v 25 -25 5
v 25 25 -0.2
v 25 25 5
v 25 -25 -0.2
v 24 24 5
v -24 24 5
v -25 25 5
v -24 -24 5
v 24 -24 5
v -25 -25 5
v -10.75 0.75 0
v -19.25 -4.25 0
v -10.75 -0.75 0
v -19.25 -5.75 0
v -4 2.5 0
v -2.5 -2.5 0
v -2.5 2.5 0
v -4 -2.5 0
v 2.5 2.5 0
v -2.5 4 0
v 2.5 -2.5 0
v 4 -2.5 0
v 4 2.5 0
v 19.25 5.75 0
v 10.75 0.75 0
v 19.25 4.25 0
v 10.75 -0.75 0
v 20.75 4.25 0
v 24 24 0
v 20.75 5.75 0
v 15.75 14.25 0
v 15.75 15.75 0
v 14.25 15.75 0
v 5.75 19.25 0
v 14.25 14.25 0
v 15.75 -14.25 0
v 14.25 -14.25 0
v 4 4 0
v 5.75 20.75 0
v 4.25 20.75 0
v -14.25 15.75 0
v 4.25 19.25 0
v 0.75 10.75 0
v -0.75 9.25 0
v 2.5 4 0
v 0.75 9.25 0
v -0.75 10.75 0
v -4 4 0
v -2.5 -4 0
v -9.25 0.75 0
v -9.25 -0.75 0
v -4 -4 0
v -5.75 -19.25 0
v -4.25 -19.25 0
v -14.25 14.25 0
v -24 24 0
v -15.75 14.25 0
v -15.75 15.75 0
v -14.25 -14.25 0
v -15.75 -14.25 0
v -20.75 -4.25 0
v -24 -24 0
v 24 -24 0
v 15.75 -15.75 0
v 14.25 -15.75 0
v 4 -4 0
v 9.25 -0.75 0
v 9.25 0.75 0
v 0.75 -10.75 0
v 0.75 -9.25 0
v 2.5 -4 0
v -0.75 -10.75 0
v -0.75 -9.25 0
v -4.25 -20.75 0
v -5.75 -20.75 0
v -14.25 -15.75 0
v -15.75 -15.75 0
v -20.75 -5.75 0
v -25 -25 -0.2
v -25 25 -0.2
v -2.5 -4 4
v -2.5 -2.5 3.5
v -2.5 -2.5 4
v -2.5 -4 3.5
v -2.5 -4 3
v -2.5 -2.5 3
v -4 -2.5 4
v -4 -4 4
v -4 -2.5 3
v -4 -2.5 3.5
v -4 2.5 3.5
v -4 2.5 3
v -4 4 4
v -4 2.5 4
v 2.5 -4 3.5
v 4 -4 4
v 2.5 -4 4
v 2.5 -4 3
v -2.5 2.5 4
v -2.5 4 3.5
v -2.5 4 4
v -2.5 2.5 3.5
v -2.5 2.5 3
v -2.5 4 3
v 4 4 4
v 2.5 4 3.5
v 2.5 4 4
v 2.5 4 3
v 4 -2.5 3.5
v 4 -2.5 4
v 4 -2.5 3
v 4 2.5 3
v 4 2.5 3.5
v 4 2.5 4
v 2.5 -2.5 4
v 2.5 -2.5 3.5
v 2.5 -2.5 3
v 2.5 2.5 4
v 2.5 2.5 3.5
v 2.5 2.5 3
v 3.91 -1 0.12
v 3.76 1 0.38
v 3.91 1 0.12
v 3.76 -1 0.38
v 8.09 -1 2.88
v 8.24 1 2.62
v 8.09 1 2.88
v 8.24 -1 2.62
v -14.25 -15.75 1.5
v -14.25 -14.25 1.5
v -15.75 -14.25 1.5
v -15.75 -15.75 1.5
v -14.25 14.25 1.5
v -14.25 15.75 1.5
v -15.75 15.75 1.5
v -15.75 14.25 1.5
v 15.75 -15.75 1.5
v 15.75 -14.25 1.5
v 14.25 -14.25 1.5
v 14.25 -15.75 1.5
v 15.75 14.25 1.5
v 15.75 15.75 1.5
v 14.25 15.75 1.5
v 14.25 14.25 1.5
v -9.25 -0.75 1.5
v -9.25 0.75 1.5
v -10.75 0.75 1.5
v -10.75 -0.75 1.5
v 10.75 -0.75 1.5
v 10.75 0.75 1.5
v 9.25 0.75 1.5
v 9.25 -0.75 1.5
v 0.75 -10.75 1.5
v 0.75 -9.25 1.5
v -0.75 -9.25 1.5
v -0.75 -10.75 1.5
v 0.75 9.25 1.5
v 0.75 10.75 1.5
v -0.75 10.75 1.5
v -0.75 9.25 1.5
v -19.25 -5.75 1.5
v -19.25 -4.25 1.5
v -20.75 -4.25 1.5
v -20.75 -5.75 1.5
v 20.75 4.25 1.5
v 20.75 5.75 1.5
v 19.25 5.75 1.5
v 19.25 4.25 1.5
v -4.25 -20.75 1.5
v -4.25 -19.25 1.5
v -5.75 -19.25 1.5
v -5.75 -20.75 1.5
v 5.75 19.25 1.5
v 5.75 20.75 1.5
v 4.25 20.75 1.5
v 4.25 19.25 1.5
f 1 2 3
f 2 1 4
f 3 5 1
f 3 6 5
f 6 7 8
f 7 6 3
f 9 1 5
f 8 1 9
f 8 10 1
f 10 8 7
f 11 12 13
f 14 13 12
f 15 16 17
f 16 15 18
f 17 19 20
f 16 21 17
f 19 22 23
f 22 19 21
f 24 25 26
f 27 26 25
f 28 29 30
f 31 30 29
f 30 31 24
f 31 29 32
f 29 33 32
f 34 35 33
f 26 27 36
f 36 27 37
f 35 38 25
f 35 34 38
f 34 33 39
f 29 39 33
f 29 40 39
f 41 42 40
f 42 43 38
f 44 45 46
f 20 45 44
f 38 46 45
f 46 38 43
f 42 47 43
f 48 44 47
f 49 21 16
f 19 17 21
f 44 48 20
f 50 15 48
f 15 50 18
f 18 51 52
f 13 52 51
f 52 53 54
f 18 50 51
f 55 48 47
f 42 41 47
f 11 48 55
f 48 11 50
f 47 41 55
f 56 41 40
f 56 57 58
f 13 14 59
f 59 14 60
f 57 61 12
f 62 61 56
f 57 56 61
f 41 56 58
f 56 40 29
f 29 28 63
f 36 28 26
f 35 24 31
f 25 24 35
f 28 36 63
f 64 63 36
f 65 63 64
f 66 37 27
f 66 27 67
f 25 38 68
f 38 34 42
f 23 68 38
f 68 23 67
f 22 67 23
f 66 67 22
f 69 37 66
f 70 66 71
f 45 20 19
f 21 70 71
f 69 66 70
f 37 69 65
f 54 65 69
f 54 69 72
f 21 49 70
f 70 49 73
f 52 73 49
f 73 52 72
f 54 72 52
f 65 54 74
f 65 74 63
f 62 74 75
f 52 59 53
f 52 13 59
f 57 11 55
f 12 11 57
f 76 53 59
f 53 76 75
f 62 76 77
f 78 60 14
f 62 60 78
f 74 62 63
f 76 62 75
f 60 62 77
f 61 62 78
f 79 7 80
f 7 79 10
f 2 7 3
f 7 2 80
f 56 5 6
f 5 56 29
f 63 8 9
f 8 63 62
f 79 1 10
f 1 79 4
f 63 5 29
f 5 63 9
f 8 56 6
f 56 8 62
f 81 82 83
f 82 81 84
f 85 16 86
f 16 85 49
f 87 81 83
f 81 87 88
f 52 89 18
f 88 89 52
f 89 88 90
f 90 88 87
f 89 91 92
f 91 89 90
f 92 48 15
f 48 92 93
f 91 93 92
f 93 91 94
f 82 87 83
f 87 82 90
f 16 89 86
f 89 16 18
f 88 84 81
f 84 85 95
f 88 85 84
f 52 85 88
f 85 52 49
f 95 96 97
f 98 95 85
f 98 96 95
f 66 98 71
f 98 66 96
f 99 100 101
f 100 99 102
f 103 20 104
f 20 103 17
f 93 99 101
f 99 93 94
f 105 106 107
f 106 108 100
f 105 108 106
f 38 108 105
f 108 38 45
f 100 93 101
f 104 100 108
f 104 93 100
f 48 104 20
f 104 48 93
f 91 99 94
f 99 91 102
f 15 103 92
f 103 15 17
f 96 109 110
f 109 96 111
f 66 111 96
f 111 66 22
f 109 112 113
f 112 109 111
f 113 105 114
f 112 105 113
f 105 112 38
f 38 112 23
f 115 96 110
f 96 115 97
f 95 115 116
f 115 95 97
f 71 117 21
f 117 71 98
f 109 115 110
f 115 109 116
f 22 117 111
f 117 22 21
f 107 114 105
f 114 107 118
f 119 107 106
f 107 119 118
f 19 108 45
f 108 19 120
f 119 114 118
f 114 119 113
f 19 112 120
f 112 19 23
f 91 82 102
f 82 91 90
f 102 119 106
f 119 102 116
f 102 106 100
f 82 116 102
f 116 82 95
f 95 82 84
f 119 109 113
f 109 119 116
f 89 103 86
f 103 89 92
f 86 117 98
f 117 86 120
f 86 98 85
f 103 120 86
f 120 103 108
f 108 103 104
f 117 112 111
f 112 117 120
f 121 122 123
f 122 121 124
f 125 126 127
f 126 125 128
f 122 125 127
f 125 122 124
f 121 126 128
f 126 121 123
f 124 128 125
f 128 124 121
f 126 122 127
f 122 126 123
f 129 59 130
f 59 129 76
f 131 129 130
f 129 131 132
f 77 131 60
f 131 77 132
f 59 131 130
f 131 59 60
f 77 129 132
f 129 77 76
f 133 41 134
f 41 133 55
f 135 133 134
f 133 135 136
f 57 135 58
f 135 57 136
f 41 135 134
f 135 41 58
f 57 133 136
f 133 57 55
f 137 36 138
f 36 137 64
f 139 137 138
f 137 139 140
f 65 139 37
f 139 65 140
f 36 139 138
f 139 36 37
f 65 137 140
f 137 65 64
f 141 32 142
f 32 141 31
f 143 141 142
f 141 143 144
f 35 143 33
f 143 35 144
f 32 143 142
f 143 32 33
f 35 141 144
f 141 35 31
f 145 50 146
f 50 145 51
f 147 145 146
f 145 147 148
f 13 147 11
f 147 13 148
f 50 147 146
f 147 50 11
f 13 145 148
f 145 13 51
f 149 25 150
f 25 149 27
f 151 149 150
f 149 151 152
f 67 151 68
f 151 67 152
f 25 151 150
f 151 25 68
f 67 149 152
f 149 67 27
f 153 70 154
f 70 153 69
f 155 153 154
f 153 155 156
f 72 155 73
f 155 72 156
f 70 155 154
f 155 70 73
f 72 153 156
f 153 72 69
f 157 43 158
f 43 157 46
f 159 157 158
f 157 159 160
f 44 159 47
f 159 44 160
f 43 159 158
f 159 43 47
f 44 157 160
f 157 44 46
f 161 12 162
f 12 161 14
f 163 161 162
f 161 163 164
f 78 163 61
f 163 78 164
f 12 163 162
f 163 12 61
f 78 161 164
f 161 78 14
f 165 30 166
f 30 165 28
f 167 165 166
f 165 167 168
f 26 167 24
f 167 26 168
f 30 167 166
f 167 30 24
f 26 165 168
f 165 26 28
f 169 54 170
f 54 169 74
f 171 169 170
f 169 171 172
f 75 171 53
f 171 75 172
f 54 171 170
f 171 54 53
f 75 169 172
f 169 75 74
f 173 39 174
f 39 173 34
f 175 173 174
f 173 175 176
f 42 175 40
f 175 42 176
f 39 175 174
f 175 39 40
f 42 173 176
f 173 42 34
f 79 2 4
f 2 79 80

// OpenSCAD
// Arena Shooter - Map Arena
// 50x50m arena with platforms and cover
// Units in meters

$fn = 16; // Lower for faster rendering

// Arena dimensions
arena_size = 50;
wall_height = 5;
wall_thickness = 1;

// Central structure
center_size = 8;
platform_height = 3;
pillar_size = 1.5;

// Cover crate dimensions
crate_size = 1.5;

module ground() {
    color([0.4, 0.4, 0.4])
    translate([0, 0, -0.1])
        cube([arena_size, arena_size, 0.2], center=true);
}

module walls() {
    color([0.5, 0.5, 0.5]) {
        half = arena_size / 2;

        // North wall
        translate([0, half - wall_thickness/2, wall_height/2])
            cube([arena_size, wall_thickness, wall_height], center=true);

        // South wall
        translate([0, -half + wall_thickness/2, wall_height/2])
            cube([arena_size, wall_thickness, wall_height], center=true);

        // East wall
        translate([half - wall_thickness/2, 0, wall_height/2])
            cube([wall_thickness, arena_size, wall_height], center=true);

        // West wall
        translate([-half + wall_thickness/2, 0, wall_height/2])
            cube([wall_thickness, arena_size, wall_height], center=true);
    }
}

module central_structure() {
    pillar_offset = center_size/2 - pillar_size/2;

    // Four corner pillars
    color([0.6, 0.55, 0.5]) {
        for (x = [-1, 1]) {
            for (y = [-1, 1]) {
                translate([x * pillar_offset, y * pillar_offset, (platform_height + 1)/2])
                    cube([pillar_size, pillar_size, platform_height + 1], center=true);
            }
        }
    }

    // Central platform
    color([0.55, 0.45, 0.35])
    translate([0, 0, platform_height + 0.25])
        cube([center_size, center_size, 0.5], center=true);

    // Ramp to platform (optional access)
    color([0.5, 0.4, 0.3])
    translate([center_size/2 + 2, 0, platform_height/2])
        rotate([0, -30, 0])
        cube([5, 2, 0.3], center=true);
}

module cover_crate(x, y) {
    color([0.6, 0.5, 0.3])
    translate([x, y, crate_size/2])
        cube([crate_size, crate_size, crate_size], center=true);
}

module cover_objects() {
    // Scattered crates around the arena
    // Corner positions
    cover_crate(-15, -15);
    cover_crate(-15, 15);
    cover_crate(15, -15);
    cover_crate(15, 15);

    // Side positions
    cover_crate(-10, 0);
    cover_crate(10, 0);
    cover_crate(0, -10);
    cover_crate(0, 10);

    // Diagonal positions
    cover_crate(-20, -5);
    cover_crate(20, 5);
    cover_crate(-5, -20);
    cover_crate(5, 20);
}

module spawn_markers() {
    // Visual markers for spawn points (debug/preview only)
    spawn_radius = arena_size/2 - 5;
    num_spawns = 8;

    color([0, 1, 0, 0.5])
    for (i = [0:num_spawns-1]) {
        angle = i * 360 / num_spawns;
        x = cos(angle) * spawn_radius;
        y = sin(angle) * spawn_radius;
        translate([x, y, 0.05])
            cylinder(h=0.1, r=0.5);
    }
}

// Generate the complete arena
module arena() {
    ground();
    walls();
    central_structure();
    cover_objects();
    // spawn_markers(); // Uncomment to show spawn points
}

arena();
